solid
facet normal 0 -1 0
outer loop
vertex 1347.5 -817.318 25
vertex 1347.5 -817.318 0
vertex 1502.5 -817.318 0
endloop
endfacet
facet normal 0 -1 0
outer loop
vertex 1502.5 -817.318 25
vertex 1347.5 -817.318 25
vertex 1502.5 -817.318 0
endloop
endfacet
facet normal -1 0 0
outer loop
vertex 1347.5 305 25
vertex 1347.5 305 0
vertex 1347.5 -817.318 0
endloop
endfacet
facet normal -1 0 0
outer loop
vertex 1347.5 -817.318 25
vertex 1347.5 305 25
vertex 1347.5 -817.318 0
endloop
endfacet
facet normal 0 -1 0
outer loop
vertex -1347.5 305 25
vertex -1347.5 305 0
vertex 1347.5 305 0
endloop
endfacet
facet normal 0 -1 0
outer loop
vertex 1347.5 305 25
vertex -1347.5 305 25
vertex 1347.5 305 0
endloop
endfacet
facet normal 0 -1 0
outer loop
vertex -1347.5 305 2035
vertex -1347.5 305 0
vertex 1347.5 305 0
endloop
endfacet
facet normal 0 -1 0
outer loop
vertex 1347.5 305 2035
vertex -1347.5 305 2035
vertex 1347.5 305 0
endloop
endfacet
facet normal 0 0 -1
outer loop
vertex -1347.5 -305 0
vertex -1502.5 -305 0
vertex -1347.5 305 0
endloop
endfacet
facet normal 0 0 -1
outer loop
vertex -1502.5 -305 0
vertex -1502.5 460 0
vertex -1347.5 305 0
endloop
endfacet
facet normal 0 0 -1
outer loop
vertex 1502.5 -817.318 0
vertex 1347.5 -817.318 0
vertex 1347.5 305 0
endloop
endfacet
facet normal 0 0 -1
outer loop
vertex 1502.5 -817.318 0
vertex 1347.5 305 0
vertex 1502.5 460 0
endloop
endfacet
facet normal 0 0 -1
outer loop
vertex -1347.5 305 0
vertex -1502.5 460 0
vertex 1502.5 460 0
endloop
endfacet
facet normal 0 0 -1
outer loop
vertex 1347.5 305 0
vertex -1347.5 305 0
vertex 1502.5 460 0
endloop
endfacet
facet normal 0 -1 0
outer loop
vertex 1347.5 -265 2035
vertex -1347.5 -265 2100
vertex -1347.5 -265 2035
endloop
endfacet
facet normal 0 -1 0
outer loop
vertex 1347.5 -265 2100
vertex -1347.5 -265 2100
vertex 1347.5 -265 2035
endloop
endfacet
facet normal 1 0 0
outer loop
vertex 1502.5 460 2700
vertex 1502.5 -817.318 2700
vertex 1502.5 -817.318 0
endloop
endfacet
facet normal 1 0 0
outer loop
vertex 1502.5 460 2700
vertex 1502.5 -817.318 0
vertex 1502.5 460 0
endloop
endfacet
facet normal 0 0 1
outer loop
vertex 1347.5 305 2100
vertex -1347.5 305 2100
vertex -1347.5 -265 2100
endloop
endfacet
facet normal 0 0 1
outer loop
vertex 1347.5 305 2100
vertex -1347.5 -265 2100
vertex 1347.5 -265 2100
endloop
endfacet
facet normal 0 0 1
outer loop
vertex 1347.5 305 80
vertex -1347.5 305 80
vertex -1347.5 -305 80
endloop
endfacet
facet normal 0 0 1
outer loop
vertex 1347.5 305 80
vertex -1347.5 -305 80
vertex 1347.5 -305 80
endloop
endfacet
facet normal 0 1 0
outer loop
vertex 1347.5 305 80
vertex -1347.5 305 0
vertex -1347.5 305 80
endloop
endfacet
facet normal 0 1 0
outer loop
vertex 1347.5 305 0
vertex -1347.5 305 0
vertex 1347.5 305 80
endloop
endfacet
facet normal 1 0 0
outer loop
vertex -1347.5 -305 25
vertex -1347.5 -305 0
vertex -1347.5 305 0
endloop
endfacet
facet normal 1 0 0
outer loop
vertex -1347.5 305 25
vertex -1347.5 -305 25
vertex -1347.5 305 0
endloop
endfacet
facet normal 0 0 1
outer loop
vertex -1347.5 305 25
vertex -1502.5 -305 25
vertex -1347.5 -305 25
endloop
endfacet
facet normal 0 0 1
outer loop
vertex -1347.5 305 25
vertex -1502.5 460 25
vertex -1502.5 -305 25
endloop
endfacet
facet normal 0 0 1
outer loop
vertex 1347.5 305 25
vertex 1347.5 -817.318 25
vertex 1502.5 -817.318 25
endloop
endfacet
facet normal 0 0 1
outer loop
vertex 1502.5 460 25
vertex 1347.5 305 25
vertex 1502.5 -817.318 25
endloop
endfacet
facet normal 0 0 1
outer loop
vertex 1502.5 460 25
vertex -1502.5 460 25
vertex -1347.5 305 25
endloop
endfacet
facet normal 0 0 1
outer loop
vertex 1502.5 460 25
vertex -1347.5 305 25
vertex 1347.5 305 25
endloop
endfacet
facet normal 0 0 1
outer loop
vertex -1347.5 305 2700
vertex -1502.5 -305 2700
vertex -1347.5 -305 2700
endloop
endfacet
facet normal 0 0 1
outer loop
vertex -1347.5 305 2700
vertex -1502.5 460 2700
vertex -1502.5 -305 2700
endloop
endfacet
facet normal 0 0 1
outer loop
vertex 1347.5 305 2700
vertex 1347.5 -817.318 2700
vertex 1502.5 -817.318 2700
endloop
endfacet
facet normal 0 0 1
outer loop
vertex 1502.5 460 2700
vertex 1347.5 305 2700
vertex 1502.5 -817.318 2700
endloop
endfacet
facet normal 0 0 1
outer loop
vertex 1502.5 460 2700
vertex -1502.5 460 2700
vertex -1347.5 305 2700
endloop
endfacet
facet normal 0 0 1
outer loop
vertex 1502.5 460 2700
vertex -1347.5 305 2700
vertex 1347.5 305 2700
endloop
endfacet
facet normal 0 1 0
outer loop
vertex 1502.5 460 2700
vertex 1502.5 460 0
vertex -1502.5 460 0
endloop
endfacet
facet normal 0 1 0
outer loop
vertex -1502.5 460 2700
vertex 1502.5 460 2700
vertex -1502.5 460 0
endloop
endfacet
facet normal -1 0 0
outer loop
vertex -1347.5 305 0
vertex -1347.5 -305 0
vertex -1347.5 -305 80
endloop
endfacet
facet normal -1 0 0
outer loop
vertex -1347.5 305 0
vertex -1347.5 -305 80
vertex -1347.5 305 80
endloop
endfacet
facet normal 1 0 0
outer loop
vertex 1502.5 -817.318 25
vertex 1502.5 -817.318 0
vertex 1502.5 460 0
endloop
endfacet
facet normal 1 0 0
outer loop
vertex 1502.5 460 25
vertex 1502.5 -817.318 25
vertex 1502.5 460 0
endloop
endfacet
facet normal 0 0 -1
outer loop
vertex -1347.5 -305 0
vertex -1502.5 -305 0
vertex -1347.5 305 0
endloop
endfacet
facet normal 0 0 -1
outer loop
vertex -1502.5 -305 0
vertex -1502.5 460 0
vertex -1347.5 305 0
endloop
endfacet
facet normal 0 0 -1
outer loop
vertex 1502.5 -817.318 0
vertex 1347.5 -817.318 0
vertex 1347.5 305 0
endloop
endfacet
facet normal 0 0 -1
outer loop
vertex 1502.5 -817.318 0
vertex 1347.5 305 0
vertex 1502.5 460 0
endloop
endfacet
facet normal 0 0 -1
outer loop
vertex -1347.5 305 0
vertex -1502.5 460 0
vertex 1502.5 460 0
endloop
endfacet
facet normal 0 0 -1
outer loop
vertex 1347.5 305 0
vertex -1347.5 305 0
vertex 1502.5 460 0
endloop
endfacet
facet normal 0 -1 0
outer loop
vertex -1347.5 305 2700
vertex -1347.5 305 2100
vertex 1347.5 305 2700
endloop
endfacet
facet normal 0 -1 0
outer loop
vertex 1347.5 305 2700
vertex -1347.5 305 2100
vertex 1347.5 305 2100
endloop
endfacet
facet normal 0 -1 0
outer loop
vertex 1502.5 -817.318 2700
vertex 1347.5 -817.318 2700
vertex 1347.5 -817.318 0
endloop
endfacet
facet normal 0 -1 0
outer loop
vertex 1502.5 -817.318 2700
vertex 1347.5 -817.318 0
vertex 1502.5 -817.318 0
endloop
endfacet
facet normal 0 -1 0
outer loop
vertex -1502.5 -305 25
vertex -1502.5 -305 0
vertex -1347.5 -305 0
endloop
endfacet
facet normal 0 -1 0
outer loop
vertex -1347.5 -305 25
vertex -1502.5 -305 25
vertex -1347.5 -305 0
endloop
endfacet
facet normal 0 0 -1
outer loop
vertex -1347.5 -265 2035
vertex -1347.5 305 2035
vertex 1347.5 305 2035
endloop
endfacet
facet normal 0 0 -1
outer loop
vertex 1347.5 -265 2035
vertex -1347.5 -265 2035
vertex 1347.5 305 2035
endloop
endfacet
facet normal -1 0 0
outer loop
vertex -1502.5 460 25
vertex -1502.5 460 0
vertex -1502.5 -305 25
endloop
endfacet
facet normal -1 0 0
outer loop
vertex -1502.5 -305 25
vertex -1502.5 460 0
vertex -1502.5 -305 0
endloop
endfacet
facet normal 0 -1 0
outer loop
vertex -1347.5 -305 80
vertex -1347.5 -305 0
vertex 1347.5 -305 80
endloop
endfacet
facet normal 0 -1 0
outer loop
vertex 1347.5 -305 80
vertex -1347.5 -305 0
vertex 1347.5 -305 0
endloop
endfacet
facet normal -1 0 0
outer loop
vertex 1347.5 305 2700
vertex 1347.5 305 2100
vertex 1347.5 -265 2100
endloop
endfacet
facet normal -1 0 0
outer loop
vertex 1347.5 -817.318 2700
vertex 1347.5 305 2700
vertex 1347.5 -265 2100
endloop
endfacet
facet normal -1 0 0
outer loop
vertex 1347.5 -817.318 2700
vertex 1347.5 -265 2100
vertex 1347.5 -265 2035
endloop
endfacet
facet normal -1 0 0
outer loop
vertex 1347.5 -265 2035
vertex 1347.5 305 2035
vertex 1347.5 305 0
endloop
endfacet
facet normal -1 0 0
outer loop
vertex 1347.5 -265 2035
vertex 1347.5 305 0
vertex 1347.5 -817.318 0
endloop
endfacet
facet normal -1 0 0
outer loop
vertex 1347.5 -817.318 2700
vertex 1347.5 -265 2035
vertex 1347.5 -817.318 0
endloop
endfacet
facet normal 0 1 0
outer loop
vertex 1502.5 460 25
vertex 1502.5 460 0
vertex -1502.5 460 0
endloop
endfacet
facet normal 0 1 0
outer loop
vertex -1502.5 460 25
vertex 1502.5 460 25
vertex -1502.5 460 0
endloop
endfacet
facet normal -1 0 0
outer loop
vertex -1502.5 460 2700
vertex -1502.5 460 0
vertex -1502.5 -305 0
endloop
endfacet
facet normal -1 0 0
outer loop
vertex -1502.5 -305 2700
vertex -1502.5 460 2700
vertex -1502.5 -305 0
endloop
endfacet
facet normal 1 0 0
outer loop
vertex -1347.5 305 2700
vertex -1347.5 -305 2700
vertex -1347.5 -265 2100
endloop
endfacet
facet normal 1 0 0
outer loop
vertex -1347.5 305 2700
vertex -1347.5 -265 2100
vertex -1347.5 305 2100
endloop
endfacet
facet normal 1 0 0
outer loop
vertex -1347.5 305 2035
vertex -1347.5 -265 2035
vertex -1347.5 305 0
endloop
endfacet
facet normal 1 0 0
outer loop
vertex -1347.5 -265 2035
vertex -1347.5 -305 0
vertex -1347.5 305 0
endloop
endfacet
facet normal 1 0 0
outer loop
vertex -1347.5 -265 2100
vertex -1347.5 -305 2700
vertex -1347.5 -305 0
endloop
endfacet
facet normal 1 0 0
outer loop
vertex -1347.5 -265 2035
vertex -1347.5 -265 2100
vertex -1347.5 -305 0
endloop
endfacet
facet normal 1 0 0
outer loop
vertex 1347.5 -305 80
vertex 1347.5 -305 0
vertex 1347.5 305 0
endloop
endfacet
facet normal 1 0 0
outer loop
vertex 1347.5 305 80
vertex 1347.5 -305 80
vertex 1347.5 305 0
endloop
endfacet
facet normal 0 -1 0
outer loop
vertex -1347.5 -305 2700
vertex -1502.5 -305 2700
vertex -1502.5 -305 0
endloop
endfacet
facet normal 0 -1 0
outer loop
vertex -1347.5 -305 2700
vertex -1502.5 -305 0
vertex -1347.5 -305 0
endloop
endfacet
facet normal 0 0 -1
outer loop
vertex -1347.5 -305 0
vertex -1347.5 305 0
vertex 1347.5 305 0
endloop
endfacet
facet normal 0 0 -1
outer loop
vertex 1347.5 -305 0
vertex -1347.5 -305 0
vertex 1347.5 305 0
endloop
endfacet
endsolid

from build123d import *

# Parameters (mm, degrees)
F2_DEPTH = 2700
F0_W     = 2695
F0_H     = 610
F3_DEPTH = 80
F4_DEPTH = 25
F5_W     = 2695
F5_H     = 65
F6_DEPTH = 570


with BuildPart() as f2:
    # F1 (on Top) → F2 (new body)
    with BuildSketch(Plane.XY):
        Polygon((-1502.5, -305), (-1347.5, -305), (-1347.5, 305), (1347.5, 305), (1347.5, -817.318022), (1502.5, -817.318022), (1502.5, 460), (-1502.5, 460), align=None)
    extrude(amount=F2_DEPTH)

    # F5 (on face) → F6 (join)
    with BuildSketch(Plane.XZ.offset(-305)):
        with Locations((0, 2067.5)):
            Rectangle(F5_W, F5_H)
    extrude(amount=F6_DEPTH)


with BuildPart() as f3:
    # F0 (on Top) → F3 (new body)
    with BuildSketch(Plane.XY):
        Rectangle(F0_W, F0_H)
    extrude(amount=F3_DEPTH)


with BuildPart() as f4:
    # F1 (on Top) → F4 (new body)
    with BuildSketch(Plane.XY):
        Polygon((-1502.5, -305), (-1347.5, -305), (-1347.5, 305), (1347.5, 305), (1347.5, -817.318022), (1502.5, -817.318022), (1502.5, 460), (-1502.5, 460), align=None)
    extrude(amount=F4_DEPTH)


solid = Compound([f2.part, f3.part, f4.part])
